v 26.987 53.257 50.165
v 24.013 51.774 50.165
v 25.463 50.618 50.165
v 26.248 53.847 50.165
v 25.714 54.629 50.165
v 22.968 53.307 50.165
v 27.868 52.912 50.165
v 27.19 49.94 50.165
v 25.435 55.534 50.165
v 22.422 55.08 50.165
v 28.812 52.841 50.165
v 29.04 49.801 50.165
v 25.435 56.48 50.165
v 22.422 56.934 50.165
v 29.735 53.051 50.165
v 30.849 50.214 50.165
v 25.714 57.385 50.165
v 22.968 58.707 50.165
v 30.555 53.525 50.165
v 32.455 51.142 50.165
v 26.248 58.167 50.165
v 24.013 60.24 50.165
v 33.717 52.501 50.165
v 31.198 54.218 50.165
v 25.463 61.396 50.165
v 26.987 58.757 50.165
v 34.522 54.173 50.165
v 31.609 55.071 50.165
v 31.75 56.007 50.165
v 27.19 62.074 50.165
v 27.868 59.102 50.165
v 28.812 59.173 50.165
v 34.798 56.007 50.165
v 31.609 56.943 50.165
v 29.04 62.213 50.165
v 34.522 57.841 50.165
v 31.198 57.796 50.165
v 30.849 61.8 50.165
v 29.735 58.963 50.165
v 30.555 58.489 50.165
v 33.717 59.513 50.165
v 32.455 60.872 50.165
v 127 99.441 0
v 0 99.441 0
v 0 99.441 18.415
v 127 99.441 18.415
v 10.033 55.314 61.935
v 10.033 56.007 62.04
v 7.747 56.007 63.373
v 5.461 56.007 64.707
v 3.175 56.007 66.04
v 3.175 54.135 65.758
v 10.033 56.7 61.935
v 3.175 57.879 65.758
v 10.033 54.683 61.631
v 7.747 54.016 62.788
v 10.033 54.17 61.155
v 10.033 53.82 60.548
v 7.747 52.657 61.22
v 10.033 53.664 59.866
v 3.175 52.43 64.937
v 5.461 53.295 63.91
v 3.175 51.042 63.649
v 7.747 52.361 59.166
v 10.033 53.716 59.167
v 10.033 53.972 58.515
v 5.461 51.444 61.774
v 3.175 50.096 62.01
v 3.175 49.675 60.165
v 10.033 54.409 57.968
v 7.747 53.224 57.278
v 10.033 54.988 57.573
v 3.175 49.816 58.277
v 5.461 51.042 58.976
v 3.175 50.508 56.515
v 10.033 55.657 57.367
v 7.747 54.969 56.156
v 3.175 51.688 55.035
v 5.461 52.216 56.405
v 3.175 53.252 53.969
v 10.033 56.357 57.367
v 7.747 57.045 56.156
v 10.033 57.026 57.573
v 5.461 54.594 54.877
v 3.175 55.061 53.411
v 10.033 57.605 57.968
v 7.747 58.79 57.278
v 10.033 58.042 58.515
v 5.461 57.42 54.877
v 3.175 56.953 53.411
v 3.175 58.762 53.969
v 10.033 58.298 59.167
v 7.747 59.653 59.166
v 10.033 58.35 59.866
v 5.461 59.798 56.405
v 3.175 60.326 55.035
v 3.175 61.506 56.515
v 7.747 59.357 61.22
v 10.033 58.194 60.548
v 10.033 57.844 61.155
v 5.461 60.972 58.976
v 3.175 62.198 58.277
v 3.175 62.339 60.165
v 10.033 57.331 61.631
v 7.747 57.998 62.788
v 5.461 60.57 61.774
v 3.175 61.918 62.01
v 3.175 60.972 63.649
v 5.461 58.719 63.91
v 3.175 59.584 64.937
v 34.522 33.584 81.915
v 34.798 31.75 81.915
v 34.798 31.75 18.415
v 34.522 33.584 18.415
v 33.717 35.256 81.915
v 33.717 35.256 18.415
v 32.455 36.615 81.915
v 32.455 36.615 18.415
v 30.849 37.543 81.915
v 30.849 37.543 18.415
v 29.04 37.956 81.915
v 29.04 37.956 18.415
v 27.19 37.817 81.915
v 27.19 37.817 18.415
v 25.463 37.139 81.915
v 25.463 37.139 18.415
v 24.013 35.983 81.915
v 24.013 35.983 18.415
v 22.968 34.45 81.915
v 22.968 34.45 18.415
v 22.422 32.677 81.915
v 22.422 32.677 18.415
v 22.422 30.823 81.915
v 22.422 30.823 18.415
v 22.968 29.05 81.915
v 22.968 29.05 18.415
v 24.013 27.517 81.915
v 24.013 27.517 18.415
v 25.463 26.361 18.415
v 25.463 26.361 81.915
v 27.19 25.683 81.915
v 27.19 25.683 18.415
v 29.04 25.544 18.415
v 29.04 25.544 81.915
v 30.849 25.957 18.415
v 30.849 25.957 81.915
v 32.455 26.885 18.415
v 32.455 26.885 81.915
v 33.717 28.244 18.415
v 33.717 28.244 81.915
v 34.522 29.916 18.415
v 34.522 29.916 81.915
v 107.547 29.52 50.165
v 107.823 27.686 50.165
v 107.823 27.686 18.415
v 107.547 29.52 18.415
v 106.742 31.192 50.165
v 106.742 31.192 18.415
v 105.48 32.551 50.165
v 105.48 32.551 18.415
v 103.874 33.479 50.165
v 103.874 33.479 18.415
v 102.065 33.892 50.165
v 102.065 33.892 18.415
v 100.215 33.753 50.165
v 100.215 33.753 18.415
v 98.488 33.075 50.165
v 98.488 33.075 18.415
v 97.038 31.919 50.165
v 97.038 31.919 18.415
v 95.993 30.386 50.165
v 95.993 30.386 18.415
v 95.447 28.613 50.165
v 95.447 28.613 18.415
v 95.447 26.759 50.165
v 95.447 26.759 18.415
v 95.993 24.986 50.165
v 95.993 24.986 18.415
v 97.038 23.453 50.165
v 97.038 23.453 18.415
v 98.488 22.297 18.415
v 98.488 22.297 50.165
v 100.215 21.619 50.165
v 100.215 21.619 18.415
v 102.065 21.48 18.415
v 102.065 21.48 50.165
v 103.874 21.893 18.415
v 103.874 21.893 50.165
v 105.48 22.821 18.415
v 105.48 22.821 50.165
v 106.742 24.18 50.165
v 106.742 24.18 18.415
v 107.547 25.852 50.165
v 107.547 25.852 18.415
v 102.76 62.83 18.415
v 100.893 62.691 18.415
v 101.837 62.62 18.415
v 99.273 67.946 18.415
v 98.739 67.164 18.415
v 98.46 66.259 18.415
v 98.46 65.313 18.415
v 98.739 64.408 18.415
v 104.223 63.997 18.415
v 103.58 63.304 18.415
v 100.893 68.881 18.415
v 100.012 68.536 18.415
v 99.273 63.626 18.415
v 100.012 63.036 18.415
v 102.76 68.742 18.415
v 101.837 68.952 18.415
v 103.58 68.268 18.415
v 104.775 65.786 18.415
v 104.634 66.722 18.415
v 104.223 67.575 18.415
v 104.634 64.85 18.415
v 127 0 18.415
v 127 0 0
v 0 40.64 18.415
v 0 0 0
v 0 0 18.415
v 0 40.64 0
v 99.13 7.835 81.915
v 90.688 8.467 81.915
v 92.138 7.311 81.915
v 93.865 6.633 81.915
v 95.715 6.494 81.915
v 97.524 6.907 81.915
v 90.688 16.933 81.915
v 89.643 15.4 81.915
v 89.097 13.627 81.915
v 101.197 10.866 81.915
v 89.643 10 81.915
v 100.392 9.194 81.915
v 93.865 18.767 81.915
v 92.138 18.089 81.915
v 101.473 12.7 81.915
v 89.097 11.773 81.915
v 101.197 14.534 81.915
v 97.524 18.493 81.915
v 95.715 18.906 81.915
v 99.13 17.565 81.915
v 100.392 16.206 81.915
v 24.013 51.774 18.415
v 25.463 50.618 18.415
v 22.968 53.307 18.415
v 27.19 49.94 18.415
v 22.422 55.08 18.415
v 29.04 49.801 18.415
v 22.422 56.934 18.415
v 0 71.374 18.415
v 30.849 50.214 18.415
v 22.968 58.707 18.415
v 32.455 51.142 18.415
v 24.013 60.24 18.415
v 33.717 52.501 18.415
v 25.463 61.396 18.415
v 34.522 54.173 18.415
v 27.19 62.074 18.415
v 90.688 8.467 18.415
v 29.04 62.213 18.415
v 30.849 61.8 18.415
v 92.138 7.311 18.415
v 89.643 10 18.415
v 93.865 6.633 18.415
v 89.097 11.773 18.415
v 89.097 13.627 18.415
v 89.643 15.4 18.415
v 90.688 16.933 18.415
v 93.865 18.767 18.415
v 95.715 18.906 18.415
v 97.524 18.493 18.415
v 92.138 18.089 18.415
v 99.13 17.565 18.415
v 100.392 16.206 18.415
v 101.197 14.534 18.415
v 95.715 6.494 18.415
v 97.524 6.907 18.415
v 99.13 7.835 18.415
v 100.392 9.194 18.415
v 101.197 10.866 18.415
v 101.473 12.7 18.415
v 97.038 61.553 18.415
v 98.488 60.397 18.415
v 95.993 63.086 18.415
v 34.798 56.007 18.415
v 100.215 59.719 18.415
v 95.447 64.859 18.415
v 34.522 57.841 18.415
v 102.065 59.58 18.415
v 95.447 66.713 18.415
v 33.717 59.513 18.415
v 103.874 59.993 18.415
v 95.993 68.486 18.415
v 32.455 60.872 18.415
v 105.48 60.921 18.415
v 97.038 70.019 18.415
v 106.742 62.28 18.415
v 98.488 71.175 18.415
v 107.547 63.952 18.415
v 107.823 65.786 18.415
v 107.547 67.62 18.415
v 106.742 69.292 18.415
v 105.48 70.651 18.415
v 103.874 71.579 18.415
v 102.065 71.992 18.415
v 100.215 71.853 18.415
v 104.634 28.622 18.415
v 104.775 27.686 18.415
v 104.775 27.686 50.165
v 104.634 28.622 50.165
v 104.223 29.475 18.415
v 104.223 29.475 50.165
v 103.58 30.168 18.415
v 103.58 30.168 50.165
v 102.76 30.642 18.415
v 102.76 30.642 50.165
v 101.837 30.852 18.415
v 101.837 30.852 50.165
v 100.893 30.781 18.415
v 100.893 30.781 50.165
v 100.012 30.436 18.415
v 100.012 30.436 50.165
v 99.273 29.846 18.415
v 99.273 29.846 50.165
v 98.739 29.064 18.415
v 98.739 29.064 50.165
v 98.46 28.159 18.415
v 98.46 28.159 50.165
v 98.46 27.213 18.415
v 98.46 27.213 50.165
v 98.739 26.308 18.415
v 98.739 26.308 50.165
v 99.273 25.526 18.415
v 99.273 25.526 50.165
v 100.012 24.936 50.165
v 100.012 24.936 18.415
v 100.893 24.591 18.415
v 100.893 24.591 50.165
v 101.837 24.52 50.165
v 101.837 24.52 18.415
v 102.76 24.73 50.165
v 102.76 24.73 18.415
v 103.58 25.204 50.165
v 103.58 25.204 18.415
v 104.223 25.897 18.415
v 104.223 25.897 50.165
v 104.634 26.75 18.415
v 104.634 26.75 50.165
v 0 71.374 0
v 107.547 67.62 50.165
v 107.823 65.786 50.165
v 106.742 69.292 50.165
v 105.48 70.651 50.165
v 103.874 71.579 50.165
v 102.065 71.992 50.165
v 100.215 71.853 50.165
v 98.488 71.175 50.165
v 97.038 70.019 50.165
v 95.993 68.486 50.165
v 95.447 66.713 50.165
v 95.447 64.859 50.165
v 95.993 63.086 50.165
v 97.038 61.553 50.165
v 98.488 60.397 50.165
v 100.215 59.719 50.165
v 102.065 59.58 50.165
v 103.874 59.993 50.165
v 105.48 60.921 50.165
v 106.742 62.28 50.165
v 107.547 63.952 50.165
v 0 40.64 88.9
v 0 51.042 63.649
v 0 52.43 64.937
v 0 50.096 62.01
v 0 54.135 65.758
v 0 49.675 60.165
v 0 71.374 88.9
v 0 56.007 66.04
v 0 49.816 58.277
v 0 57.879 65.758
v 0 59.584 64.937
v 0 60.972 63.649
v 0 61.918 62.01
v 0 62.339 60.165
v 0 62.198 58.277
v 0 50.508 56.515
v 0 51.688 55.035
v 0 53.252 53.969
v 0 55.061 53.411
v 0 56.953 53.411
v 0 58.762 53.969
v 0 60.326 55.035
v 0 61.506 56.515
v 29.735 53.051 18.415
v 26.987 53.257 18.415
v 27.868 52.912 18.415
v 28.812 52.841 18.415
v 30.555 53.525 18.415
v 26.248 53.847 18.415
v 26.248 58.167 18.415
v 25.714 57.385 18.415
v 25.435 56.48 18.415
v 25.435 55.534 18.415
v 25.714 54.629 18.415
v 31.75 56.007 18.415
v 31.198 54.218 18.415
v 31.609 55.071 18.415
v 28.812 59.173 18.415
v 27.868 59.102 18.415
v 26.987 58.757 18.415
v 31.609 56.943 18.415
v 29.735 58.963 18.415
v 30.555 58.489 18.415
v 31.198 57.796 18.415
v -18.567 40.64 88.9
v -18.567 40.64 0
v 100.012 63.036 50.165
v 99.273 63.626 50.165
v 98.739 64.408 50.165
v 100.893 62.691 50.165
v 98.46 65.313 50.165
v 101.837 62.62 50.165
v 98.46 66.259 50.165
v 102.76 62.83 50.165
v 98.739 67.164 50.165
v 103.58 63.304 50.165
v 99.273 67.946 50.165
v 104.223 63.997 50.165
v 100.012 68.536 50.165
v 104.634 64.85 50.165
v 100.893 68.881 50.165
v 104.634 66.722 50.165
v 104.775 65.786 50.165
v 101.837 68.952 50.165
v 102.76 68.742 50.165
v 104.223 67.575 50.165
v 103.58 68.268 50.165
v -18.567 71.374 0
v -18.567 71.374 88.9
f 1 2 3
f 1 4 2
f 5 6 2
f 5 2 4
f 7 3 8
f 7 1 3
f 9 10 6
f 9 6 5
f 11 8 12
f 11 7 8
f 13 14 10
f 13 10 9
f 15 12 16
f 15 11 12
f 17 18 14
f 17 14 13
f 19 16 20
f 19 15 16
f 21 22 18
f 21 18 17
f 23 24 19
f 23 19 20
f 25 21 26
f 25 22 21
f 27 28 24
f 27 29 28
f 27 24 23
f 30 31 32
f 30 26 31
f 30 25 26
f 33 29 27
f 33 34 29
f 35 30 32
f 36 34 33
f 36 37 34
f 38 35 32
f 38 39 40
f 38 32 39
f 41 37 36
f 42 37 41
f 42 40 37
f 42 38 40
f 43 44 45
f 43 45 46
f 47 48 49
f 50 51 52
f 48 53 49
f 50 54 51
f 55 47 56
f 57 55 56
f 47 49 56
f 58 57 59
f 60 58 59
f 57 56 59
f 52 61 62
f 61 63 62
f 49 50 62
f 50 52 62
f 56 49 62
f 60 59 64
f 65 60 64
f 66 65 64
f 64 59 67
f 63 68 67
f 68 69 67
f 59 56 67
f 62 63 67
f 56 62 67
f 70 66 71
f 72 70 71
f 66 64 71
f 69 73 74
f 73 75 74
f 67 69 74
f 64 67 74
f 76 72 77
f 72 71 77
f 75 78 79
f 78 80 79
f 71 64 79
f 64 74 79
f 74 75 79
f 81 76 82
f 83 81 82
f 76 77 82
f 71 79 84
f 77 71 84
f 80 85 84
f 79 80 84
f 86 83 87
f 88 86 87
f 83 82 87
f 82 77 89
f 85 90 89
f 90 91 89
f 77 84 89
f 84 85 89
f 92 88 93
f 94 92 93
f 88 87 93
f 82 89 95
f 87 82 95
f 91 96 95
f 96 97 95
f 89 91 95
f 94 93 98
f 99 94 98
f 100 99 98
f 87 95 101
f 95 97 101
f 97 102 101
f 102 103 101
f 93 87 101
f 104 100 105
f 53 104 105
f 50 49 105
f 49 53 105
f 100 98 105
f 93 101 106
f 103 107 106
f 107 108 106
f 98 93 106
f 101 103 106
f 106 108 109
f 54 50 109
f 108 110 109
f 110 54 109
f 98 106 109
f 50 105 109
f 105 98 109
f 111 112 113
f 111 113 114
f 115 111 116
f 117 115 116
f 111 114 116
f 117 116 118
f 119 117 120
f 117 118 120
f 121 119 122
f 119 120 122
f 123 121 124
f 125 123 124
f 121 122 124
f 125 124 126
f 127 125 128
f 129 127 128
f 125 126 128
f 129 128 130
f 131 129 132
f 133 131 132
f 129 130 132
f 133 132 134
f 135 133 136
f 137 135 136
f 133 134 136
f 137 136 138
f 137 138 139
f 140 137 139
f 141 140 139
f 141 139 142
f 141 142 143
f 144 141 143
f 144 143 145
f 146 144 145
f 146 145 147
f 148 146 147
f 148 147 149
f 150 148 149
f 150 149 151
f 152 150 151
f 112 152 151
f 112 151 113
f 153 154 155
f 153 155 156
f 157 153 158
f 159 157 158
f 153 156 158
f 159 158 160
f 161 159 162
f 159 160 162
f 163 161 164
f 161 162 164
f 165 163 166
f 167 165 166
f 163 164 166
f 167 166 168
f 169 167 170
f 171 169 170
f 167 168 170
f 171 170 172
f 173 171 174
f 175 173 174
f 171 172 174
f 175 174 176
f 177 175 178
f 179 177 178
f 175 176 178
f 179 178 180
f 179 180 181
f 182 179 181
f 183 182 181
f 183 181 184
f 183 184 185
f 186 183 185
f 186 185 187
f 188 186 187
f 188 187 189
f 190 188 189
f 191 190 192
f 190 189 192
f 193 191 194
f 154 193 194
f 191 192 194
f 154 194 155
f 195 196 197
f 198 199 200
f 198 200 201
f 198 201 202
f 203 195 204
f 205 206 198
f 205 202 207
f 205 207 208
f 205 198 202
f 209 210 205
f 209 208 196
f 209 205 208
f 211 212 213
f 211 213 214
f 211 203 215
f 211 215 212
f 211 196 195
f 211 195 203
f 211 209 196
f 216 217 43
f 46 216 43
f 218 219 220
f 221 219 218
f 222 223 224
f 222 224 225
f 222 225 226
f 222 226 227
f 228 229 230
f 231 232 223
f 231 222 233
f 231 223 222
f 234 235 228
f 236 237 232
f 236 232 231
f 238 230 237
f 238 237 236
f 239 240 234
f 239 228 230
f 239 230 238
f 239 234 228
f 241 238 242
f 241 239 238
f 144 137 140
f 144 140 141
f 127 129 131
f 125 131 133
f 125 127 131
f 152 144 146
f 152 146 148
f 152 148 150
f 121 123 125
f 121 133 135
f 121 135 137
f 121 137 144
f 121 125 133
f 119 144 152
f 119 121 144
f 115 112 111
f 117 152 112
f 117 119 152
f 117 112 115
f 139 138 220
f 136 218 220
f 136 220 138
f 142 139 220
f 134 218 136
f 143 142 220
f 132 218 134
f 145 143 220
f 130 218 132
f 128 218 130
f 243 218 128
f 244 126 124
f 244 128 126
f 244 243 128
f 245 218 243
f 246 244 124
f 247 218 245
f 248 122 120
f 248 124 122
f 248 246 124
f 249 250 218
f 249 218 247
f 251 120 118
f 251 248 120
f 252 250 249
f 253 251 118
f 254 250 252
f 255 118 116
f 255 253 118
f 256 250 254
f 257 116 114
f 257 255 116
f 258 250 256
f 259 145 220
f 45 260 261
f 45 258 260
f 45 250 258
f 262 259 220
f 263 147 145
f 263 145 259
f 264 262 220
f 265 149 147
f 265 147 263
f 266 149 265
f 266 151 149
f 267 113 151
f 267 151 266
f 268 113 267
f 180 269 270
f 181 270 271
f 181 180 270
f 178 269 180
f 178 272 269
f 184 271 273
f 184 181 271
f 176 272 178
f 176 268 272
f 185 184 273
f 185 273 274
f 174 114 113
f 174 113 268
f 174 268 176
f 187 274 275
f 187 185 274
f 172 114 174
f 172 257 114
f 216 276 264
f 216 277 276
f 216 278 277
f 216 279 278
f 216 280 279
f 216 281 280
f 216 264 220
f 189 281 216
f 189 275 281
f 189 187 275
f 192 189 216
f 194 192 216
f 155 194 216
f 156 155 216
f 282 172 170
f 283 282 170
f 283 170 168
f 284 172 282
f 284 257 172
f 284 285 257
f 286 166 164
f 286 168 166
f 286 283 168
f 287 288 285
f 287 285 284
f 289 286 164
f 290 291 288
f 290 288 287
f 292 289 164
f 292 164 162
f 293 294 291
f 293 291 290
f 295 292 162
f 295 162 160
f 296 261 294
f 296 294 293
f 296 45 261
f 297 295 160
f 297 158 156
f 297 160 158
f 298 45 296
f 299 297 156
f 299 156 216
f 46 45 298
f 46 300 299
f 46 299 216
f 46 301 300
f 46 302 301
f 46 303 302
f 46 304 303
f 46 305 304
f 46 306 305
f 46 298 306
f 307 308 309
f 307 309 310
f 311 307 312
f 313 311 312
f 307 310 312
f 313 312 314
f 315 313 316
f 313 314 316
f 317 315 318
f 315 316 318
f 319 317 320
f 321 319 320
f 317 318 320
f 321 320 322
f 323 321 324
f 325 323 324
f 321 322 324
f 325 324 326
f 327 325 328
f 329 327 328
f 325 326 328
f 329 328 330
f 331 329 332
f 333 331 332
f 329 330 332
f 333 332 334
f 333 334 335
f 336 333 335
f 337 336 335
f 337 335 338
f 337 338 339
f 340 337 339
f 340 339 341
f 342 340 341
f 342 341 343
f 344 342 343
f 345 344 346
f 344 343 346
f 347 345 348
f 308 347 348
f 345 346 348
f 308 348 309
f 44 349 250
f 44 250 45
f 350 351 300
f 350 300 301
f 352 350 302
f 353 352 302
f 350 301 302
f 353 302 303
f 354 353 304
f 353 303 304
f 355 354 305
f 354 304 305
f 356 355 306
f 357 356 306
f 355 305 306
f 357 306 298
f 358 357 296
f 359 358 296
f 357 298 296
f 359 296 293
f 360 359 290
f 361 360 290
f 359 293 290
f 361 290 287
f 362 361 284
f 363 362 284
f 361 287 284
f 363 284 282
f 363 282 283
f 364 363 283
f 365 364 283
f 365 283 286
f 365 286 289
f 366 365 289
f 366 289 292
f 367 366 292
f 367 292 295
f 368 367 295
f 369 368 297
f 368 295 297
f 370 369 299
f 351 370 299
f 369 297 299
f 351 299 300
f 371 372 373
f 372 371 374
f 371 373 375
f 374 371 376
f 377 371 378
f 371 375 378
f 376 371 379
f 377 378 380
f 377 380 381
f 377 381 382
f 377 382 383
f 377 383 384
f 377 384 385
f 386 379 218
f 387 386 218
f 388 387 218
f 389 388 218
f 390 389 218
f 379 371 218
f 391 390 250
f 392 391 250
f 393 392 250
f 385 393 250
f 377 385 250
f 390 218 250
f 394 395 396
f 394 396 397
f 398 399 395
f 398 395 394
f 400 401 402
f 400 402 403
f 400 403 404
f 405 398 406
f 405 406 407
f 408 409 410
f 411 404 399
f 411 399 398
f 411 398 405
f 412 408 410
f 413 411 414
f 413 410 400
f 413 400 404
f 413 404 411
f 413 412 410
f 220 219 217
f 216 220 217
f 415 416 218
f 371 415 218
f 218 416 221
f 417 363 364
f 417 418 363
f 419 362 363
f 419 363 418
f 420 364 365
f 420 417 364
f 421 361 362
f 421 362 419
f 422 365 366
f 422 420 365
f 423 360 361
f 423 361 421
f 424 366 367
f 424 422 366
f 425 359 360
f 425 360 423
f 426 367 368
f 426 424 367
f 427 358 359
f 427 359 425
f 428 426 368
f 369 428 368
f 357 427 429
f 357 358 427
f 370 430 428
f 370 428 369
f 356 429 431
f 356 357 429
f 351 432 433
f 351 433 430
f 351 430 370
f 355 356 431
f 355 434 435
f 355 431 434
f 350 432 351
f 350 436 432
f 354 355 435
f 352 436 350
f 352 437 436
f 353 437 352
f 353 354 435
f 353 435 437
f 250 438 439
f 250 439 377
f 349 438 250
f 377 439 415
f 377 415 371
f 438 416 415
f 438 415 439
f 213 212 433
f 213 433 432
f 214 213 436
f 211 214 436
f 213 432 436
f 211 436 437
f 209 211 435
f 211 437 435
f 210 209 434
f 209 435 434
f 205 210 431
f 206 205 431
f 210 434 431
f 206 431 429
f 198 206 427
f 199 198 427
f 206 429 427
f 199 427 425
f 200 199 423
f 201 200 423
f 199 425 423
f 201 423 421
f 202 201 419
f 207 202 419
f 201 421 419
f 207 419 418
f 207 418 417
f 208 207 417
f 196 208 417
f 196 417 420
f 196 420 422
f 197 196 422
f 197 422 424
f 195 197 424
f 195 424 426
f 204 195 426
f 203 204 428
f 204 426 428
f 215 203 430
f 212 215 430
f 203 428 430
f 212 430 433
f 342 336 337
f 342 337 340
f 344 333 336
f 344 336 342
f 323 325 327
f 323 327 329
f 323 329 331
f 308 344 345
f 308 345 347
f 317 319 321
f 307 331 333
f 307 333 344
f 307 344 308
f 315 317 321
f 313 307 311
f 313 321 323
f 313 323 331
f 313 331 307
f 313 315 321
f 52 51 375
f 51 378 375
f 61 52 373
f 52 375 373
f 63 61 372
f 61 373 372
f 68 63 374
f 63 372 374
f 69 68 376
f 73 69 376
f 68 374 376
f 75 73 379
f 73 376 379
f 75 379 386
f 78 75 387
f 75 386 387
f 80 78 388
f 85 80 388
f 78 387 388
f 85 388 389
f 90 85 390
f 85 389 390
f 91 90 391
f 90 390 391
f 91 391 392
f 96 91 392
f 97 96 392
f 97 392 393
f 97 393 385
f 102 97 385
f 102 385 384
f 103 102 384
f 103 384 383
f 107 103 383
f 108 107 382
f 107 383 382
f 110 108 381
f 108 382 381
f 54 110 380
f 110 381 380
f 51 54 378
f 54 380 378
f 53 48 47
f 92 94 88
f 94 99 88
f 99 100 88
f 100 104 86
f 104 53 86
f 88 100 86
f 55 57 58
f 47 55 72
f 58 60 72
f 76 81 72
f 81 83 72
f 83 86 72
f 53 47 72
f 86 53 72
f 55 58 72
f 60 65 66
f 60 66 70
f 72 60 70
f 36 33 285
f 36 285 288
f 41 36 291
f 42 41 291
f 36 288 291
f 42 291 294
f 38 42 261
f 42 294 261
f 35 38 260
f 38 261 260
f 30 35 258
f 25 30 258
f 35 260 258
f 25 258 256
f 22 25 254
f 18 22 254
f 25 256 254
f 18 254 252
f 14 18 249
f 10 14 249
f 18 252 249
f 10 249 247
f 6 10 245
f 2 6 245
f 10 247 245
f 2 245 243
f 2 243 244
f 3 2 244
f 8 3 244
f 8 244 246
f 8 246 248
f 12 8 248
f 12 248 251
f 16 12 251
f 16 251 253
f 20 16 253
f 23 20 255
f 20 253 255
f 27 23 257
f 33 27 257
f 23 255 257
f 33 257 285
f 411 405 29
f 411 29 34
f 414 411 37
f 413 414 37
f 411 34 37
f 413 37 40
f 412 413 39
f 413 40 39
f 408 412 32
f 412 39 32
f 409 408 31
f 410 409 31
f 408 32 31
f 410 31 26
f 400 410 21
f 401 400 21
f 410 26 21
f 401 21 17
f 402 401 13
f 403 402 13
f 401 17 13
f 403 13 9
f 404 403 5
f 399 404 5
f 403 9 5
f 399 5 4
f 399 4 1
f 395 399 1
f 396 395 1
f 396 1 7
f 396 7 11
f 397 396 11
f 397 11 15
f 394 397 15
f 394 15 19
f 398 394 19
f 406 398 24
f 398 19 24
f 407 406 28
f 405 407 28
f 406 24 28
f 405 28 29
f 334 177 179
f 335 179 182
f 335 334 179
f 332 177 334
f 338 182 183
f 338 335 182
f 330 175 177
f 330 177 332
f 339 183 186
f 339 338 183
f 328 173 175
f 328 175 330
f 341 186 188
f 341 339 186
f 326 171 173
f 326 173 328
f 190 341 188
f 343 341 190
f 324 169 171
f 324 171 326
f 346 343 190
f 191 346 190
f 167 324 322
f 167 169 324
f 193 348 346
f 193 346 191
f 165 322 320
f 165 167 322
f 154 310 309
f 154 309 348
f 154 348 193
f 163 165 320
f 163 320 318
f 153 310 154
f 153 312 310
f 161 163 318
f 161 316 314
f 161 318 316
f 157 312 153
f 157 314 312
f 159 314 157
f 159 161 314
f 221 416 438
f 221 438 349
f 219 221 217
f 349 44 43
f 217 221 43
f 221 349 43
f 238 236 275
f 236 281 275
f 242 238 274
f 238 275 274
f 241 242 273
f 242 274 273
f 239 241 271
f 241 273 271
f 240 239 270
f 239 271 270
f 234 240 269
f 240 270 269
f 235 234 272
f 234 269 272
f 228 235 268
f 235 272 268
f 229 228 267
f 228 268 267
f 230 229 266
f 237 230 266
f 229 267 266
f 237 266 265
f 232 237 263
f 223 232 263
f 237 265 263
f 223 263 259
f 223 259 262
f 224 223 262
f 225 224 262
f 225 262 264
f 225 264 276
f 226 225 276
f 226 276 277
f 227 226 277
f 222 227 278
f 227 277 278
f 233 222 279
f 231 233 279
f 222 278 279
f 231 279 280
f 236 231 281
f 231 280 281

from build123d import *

# Parameters (mm, degrees)
F0_W      = 127
F0_H      = 99.441
F1_DEPTH  = 18.415
F2_W      = 18.5674
F2_H      = 30.734
F3_DEPTH  = 88.9
F7_R      = 6.223
F8_DEPTH  = 31.75
F10_R     = 6.223
F11_DEPTH = 31.75
F9_R      = 3.175
F12_DEPTH = 31.75


with BuildPart() as f1:
    # F0 (on Top) → F1 (new body)
    with BuildSketch(Plane.XY):
        with Locations((63.5, 49.7205)):
            Rectangle(F0_W, F0_H)
    extrude(amount=F1_DEPTH)

    # F2 (on Top) → F3 (join)
    with BuildSketch(Plane.XY):
        with Locations((-9.2837, 56.007)):
            Rectangle(F2_W, F2_H)
    extrude(amount=F3_DEPTH)

    # F5 (on offset) → F6 (revolve)
    with BuildSketch(Plane.XZ.offset(-56.007)):
        Polygon((0, 66.04), (0, 59.69), (10.033, 59.69), (10.033, 62.0395), (3.175, 66.04), align=None)
    revolve(axis=Axis((5.0165, 56.007, 59.69), (1, 0, 0)))

    # F7 (on face) → F8 (join)
    with BuildSketch(Plane.XY.offset(18.415)):
        with Locations((95.25, 12.7)):
            Circle(F7_R)
        with Locations((101.6, 27.686)):
            Circle(F7_R)
        with Locations((101.6, 65.786)):
            Circle(F7_R)
        with Locations((28.575, 56.007)):
            Circle(F7_R)
        with Locations((28.575, 31.75)):
            Circle(F7_R)
    extrude(amount=F8_DEPTH)

    # F10 (on face) → F11 (join)
    with BuildSketch(Plane.XY.offset(50.165)):
        with Locations((95.25, 12.7)):
            Circle(F10_R)
        with Locations((28.575, 31.75)):
            Circle(F10_R)
    extrude(amount=F11_DEPTH)

    # F9 (on face) → F12 (cut)
    with BuildSketch(Plane.XY.offset(50.165)):
        with Locations((28.575, 56.007)):
            Circle(F9_R)
        with Locations((101.6, 65.786)):
            Circle(F9_R)
        with Locations((101.6, 27.686)):
            Circle(F9_R)
    extrude(amount=-F12_DEPTH, mode=Mode.SUBTRACT)


solid = f1.part
